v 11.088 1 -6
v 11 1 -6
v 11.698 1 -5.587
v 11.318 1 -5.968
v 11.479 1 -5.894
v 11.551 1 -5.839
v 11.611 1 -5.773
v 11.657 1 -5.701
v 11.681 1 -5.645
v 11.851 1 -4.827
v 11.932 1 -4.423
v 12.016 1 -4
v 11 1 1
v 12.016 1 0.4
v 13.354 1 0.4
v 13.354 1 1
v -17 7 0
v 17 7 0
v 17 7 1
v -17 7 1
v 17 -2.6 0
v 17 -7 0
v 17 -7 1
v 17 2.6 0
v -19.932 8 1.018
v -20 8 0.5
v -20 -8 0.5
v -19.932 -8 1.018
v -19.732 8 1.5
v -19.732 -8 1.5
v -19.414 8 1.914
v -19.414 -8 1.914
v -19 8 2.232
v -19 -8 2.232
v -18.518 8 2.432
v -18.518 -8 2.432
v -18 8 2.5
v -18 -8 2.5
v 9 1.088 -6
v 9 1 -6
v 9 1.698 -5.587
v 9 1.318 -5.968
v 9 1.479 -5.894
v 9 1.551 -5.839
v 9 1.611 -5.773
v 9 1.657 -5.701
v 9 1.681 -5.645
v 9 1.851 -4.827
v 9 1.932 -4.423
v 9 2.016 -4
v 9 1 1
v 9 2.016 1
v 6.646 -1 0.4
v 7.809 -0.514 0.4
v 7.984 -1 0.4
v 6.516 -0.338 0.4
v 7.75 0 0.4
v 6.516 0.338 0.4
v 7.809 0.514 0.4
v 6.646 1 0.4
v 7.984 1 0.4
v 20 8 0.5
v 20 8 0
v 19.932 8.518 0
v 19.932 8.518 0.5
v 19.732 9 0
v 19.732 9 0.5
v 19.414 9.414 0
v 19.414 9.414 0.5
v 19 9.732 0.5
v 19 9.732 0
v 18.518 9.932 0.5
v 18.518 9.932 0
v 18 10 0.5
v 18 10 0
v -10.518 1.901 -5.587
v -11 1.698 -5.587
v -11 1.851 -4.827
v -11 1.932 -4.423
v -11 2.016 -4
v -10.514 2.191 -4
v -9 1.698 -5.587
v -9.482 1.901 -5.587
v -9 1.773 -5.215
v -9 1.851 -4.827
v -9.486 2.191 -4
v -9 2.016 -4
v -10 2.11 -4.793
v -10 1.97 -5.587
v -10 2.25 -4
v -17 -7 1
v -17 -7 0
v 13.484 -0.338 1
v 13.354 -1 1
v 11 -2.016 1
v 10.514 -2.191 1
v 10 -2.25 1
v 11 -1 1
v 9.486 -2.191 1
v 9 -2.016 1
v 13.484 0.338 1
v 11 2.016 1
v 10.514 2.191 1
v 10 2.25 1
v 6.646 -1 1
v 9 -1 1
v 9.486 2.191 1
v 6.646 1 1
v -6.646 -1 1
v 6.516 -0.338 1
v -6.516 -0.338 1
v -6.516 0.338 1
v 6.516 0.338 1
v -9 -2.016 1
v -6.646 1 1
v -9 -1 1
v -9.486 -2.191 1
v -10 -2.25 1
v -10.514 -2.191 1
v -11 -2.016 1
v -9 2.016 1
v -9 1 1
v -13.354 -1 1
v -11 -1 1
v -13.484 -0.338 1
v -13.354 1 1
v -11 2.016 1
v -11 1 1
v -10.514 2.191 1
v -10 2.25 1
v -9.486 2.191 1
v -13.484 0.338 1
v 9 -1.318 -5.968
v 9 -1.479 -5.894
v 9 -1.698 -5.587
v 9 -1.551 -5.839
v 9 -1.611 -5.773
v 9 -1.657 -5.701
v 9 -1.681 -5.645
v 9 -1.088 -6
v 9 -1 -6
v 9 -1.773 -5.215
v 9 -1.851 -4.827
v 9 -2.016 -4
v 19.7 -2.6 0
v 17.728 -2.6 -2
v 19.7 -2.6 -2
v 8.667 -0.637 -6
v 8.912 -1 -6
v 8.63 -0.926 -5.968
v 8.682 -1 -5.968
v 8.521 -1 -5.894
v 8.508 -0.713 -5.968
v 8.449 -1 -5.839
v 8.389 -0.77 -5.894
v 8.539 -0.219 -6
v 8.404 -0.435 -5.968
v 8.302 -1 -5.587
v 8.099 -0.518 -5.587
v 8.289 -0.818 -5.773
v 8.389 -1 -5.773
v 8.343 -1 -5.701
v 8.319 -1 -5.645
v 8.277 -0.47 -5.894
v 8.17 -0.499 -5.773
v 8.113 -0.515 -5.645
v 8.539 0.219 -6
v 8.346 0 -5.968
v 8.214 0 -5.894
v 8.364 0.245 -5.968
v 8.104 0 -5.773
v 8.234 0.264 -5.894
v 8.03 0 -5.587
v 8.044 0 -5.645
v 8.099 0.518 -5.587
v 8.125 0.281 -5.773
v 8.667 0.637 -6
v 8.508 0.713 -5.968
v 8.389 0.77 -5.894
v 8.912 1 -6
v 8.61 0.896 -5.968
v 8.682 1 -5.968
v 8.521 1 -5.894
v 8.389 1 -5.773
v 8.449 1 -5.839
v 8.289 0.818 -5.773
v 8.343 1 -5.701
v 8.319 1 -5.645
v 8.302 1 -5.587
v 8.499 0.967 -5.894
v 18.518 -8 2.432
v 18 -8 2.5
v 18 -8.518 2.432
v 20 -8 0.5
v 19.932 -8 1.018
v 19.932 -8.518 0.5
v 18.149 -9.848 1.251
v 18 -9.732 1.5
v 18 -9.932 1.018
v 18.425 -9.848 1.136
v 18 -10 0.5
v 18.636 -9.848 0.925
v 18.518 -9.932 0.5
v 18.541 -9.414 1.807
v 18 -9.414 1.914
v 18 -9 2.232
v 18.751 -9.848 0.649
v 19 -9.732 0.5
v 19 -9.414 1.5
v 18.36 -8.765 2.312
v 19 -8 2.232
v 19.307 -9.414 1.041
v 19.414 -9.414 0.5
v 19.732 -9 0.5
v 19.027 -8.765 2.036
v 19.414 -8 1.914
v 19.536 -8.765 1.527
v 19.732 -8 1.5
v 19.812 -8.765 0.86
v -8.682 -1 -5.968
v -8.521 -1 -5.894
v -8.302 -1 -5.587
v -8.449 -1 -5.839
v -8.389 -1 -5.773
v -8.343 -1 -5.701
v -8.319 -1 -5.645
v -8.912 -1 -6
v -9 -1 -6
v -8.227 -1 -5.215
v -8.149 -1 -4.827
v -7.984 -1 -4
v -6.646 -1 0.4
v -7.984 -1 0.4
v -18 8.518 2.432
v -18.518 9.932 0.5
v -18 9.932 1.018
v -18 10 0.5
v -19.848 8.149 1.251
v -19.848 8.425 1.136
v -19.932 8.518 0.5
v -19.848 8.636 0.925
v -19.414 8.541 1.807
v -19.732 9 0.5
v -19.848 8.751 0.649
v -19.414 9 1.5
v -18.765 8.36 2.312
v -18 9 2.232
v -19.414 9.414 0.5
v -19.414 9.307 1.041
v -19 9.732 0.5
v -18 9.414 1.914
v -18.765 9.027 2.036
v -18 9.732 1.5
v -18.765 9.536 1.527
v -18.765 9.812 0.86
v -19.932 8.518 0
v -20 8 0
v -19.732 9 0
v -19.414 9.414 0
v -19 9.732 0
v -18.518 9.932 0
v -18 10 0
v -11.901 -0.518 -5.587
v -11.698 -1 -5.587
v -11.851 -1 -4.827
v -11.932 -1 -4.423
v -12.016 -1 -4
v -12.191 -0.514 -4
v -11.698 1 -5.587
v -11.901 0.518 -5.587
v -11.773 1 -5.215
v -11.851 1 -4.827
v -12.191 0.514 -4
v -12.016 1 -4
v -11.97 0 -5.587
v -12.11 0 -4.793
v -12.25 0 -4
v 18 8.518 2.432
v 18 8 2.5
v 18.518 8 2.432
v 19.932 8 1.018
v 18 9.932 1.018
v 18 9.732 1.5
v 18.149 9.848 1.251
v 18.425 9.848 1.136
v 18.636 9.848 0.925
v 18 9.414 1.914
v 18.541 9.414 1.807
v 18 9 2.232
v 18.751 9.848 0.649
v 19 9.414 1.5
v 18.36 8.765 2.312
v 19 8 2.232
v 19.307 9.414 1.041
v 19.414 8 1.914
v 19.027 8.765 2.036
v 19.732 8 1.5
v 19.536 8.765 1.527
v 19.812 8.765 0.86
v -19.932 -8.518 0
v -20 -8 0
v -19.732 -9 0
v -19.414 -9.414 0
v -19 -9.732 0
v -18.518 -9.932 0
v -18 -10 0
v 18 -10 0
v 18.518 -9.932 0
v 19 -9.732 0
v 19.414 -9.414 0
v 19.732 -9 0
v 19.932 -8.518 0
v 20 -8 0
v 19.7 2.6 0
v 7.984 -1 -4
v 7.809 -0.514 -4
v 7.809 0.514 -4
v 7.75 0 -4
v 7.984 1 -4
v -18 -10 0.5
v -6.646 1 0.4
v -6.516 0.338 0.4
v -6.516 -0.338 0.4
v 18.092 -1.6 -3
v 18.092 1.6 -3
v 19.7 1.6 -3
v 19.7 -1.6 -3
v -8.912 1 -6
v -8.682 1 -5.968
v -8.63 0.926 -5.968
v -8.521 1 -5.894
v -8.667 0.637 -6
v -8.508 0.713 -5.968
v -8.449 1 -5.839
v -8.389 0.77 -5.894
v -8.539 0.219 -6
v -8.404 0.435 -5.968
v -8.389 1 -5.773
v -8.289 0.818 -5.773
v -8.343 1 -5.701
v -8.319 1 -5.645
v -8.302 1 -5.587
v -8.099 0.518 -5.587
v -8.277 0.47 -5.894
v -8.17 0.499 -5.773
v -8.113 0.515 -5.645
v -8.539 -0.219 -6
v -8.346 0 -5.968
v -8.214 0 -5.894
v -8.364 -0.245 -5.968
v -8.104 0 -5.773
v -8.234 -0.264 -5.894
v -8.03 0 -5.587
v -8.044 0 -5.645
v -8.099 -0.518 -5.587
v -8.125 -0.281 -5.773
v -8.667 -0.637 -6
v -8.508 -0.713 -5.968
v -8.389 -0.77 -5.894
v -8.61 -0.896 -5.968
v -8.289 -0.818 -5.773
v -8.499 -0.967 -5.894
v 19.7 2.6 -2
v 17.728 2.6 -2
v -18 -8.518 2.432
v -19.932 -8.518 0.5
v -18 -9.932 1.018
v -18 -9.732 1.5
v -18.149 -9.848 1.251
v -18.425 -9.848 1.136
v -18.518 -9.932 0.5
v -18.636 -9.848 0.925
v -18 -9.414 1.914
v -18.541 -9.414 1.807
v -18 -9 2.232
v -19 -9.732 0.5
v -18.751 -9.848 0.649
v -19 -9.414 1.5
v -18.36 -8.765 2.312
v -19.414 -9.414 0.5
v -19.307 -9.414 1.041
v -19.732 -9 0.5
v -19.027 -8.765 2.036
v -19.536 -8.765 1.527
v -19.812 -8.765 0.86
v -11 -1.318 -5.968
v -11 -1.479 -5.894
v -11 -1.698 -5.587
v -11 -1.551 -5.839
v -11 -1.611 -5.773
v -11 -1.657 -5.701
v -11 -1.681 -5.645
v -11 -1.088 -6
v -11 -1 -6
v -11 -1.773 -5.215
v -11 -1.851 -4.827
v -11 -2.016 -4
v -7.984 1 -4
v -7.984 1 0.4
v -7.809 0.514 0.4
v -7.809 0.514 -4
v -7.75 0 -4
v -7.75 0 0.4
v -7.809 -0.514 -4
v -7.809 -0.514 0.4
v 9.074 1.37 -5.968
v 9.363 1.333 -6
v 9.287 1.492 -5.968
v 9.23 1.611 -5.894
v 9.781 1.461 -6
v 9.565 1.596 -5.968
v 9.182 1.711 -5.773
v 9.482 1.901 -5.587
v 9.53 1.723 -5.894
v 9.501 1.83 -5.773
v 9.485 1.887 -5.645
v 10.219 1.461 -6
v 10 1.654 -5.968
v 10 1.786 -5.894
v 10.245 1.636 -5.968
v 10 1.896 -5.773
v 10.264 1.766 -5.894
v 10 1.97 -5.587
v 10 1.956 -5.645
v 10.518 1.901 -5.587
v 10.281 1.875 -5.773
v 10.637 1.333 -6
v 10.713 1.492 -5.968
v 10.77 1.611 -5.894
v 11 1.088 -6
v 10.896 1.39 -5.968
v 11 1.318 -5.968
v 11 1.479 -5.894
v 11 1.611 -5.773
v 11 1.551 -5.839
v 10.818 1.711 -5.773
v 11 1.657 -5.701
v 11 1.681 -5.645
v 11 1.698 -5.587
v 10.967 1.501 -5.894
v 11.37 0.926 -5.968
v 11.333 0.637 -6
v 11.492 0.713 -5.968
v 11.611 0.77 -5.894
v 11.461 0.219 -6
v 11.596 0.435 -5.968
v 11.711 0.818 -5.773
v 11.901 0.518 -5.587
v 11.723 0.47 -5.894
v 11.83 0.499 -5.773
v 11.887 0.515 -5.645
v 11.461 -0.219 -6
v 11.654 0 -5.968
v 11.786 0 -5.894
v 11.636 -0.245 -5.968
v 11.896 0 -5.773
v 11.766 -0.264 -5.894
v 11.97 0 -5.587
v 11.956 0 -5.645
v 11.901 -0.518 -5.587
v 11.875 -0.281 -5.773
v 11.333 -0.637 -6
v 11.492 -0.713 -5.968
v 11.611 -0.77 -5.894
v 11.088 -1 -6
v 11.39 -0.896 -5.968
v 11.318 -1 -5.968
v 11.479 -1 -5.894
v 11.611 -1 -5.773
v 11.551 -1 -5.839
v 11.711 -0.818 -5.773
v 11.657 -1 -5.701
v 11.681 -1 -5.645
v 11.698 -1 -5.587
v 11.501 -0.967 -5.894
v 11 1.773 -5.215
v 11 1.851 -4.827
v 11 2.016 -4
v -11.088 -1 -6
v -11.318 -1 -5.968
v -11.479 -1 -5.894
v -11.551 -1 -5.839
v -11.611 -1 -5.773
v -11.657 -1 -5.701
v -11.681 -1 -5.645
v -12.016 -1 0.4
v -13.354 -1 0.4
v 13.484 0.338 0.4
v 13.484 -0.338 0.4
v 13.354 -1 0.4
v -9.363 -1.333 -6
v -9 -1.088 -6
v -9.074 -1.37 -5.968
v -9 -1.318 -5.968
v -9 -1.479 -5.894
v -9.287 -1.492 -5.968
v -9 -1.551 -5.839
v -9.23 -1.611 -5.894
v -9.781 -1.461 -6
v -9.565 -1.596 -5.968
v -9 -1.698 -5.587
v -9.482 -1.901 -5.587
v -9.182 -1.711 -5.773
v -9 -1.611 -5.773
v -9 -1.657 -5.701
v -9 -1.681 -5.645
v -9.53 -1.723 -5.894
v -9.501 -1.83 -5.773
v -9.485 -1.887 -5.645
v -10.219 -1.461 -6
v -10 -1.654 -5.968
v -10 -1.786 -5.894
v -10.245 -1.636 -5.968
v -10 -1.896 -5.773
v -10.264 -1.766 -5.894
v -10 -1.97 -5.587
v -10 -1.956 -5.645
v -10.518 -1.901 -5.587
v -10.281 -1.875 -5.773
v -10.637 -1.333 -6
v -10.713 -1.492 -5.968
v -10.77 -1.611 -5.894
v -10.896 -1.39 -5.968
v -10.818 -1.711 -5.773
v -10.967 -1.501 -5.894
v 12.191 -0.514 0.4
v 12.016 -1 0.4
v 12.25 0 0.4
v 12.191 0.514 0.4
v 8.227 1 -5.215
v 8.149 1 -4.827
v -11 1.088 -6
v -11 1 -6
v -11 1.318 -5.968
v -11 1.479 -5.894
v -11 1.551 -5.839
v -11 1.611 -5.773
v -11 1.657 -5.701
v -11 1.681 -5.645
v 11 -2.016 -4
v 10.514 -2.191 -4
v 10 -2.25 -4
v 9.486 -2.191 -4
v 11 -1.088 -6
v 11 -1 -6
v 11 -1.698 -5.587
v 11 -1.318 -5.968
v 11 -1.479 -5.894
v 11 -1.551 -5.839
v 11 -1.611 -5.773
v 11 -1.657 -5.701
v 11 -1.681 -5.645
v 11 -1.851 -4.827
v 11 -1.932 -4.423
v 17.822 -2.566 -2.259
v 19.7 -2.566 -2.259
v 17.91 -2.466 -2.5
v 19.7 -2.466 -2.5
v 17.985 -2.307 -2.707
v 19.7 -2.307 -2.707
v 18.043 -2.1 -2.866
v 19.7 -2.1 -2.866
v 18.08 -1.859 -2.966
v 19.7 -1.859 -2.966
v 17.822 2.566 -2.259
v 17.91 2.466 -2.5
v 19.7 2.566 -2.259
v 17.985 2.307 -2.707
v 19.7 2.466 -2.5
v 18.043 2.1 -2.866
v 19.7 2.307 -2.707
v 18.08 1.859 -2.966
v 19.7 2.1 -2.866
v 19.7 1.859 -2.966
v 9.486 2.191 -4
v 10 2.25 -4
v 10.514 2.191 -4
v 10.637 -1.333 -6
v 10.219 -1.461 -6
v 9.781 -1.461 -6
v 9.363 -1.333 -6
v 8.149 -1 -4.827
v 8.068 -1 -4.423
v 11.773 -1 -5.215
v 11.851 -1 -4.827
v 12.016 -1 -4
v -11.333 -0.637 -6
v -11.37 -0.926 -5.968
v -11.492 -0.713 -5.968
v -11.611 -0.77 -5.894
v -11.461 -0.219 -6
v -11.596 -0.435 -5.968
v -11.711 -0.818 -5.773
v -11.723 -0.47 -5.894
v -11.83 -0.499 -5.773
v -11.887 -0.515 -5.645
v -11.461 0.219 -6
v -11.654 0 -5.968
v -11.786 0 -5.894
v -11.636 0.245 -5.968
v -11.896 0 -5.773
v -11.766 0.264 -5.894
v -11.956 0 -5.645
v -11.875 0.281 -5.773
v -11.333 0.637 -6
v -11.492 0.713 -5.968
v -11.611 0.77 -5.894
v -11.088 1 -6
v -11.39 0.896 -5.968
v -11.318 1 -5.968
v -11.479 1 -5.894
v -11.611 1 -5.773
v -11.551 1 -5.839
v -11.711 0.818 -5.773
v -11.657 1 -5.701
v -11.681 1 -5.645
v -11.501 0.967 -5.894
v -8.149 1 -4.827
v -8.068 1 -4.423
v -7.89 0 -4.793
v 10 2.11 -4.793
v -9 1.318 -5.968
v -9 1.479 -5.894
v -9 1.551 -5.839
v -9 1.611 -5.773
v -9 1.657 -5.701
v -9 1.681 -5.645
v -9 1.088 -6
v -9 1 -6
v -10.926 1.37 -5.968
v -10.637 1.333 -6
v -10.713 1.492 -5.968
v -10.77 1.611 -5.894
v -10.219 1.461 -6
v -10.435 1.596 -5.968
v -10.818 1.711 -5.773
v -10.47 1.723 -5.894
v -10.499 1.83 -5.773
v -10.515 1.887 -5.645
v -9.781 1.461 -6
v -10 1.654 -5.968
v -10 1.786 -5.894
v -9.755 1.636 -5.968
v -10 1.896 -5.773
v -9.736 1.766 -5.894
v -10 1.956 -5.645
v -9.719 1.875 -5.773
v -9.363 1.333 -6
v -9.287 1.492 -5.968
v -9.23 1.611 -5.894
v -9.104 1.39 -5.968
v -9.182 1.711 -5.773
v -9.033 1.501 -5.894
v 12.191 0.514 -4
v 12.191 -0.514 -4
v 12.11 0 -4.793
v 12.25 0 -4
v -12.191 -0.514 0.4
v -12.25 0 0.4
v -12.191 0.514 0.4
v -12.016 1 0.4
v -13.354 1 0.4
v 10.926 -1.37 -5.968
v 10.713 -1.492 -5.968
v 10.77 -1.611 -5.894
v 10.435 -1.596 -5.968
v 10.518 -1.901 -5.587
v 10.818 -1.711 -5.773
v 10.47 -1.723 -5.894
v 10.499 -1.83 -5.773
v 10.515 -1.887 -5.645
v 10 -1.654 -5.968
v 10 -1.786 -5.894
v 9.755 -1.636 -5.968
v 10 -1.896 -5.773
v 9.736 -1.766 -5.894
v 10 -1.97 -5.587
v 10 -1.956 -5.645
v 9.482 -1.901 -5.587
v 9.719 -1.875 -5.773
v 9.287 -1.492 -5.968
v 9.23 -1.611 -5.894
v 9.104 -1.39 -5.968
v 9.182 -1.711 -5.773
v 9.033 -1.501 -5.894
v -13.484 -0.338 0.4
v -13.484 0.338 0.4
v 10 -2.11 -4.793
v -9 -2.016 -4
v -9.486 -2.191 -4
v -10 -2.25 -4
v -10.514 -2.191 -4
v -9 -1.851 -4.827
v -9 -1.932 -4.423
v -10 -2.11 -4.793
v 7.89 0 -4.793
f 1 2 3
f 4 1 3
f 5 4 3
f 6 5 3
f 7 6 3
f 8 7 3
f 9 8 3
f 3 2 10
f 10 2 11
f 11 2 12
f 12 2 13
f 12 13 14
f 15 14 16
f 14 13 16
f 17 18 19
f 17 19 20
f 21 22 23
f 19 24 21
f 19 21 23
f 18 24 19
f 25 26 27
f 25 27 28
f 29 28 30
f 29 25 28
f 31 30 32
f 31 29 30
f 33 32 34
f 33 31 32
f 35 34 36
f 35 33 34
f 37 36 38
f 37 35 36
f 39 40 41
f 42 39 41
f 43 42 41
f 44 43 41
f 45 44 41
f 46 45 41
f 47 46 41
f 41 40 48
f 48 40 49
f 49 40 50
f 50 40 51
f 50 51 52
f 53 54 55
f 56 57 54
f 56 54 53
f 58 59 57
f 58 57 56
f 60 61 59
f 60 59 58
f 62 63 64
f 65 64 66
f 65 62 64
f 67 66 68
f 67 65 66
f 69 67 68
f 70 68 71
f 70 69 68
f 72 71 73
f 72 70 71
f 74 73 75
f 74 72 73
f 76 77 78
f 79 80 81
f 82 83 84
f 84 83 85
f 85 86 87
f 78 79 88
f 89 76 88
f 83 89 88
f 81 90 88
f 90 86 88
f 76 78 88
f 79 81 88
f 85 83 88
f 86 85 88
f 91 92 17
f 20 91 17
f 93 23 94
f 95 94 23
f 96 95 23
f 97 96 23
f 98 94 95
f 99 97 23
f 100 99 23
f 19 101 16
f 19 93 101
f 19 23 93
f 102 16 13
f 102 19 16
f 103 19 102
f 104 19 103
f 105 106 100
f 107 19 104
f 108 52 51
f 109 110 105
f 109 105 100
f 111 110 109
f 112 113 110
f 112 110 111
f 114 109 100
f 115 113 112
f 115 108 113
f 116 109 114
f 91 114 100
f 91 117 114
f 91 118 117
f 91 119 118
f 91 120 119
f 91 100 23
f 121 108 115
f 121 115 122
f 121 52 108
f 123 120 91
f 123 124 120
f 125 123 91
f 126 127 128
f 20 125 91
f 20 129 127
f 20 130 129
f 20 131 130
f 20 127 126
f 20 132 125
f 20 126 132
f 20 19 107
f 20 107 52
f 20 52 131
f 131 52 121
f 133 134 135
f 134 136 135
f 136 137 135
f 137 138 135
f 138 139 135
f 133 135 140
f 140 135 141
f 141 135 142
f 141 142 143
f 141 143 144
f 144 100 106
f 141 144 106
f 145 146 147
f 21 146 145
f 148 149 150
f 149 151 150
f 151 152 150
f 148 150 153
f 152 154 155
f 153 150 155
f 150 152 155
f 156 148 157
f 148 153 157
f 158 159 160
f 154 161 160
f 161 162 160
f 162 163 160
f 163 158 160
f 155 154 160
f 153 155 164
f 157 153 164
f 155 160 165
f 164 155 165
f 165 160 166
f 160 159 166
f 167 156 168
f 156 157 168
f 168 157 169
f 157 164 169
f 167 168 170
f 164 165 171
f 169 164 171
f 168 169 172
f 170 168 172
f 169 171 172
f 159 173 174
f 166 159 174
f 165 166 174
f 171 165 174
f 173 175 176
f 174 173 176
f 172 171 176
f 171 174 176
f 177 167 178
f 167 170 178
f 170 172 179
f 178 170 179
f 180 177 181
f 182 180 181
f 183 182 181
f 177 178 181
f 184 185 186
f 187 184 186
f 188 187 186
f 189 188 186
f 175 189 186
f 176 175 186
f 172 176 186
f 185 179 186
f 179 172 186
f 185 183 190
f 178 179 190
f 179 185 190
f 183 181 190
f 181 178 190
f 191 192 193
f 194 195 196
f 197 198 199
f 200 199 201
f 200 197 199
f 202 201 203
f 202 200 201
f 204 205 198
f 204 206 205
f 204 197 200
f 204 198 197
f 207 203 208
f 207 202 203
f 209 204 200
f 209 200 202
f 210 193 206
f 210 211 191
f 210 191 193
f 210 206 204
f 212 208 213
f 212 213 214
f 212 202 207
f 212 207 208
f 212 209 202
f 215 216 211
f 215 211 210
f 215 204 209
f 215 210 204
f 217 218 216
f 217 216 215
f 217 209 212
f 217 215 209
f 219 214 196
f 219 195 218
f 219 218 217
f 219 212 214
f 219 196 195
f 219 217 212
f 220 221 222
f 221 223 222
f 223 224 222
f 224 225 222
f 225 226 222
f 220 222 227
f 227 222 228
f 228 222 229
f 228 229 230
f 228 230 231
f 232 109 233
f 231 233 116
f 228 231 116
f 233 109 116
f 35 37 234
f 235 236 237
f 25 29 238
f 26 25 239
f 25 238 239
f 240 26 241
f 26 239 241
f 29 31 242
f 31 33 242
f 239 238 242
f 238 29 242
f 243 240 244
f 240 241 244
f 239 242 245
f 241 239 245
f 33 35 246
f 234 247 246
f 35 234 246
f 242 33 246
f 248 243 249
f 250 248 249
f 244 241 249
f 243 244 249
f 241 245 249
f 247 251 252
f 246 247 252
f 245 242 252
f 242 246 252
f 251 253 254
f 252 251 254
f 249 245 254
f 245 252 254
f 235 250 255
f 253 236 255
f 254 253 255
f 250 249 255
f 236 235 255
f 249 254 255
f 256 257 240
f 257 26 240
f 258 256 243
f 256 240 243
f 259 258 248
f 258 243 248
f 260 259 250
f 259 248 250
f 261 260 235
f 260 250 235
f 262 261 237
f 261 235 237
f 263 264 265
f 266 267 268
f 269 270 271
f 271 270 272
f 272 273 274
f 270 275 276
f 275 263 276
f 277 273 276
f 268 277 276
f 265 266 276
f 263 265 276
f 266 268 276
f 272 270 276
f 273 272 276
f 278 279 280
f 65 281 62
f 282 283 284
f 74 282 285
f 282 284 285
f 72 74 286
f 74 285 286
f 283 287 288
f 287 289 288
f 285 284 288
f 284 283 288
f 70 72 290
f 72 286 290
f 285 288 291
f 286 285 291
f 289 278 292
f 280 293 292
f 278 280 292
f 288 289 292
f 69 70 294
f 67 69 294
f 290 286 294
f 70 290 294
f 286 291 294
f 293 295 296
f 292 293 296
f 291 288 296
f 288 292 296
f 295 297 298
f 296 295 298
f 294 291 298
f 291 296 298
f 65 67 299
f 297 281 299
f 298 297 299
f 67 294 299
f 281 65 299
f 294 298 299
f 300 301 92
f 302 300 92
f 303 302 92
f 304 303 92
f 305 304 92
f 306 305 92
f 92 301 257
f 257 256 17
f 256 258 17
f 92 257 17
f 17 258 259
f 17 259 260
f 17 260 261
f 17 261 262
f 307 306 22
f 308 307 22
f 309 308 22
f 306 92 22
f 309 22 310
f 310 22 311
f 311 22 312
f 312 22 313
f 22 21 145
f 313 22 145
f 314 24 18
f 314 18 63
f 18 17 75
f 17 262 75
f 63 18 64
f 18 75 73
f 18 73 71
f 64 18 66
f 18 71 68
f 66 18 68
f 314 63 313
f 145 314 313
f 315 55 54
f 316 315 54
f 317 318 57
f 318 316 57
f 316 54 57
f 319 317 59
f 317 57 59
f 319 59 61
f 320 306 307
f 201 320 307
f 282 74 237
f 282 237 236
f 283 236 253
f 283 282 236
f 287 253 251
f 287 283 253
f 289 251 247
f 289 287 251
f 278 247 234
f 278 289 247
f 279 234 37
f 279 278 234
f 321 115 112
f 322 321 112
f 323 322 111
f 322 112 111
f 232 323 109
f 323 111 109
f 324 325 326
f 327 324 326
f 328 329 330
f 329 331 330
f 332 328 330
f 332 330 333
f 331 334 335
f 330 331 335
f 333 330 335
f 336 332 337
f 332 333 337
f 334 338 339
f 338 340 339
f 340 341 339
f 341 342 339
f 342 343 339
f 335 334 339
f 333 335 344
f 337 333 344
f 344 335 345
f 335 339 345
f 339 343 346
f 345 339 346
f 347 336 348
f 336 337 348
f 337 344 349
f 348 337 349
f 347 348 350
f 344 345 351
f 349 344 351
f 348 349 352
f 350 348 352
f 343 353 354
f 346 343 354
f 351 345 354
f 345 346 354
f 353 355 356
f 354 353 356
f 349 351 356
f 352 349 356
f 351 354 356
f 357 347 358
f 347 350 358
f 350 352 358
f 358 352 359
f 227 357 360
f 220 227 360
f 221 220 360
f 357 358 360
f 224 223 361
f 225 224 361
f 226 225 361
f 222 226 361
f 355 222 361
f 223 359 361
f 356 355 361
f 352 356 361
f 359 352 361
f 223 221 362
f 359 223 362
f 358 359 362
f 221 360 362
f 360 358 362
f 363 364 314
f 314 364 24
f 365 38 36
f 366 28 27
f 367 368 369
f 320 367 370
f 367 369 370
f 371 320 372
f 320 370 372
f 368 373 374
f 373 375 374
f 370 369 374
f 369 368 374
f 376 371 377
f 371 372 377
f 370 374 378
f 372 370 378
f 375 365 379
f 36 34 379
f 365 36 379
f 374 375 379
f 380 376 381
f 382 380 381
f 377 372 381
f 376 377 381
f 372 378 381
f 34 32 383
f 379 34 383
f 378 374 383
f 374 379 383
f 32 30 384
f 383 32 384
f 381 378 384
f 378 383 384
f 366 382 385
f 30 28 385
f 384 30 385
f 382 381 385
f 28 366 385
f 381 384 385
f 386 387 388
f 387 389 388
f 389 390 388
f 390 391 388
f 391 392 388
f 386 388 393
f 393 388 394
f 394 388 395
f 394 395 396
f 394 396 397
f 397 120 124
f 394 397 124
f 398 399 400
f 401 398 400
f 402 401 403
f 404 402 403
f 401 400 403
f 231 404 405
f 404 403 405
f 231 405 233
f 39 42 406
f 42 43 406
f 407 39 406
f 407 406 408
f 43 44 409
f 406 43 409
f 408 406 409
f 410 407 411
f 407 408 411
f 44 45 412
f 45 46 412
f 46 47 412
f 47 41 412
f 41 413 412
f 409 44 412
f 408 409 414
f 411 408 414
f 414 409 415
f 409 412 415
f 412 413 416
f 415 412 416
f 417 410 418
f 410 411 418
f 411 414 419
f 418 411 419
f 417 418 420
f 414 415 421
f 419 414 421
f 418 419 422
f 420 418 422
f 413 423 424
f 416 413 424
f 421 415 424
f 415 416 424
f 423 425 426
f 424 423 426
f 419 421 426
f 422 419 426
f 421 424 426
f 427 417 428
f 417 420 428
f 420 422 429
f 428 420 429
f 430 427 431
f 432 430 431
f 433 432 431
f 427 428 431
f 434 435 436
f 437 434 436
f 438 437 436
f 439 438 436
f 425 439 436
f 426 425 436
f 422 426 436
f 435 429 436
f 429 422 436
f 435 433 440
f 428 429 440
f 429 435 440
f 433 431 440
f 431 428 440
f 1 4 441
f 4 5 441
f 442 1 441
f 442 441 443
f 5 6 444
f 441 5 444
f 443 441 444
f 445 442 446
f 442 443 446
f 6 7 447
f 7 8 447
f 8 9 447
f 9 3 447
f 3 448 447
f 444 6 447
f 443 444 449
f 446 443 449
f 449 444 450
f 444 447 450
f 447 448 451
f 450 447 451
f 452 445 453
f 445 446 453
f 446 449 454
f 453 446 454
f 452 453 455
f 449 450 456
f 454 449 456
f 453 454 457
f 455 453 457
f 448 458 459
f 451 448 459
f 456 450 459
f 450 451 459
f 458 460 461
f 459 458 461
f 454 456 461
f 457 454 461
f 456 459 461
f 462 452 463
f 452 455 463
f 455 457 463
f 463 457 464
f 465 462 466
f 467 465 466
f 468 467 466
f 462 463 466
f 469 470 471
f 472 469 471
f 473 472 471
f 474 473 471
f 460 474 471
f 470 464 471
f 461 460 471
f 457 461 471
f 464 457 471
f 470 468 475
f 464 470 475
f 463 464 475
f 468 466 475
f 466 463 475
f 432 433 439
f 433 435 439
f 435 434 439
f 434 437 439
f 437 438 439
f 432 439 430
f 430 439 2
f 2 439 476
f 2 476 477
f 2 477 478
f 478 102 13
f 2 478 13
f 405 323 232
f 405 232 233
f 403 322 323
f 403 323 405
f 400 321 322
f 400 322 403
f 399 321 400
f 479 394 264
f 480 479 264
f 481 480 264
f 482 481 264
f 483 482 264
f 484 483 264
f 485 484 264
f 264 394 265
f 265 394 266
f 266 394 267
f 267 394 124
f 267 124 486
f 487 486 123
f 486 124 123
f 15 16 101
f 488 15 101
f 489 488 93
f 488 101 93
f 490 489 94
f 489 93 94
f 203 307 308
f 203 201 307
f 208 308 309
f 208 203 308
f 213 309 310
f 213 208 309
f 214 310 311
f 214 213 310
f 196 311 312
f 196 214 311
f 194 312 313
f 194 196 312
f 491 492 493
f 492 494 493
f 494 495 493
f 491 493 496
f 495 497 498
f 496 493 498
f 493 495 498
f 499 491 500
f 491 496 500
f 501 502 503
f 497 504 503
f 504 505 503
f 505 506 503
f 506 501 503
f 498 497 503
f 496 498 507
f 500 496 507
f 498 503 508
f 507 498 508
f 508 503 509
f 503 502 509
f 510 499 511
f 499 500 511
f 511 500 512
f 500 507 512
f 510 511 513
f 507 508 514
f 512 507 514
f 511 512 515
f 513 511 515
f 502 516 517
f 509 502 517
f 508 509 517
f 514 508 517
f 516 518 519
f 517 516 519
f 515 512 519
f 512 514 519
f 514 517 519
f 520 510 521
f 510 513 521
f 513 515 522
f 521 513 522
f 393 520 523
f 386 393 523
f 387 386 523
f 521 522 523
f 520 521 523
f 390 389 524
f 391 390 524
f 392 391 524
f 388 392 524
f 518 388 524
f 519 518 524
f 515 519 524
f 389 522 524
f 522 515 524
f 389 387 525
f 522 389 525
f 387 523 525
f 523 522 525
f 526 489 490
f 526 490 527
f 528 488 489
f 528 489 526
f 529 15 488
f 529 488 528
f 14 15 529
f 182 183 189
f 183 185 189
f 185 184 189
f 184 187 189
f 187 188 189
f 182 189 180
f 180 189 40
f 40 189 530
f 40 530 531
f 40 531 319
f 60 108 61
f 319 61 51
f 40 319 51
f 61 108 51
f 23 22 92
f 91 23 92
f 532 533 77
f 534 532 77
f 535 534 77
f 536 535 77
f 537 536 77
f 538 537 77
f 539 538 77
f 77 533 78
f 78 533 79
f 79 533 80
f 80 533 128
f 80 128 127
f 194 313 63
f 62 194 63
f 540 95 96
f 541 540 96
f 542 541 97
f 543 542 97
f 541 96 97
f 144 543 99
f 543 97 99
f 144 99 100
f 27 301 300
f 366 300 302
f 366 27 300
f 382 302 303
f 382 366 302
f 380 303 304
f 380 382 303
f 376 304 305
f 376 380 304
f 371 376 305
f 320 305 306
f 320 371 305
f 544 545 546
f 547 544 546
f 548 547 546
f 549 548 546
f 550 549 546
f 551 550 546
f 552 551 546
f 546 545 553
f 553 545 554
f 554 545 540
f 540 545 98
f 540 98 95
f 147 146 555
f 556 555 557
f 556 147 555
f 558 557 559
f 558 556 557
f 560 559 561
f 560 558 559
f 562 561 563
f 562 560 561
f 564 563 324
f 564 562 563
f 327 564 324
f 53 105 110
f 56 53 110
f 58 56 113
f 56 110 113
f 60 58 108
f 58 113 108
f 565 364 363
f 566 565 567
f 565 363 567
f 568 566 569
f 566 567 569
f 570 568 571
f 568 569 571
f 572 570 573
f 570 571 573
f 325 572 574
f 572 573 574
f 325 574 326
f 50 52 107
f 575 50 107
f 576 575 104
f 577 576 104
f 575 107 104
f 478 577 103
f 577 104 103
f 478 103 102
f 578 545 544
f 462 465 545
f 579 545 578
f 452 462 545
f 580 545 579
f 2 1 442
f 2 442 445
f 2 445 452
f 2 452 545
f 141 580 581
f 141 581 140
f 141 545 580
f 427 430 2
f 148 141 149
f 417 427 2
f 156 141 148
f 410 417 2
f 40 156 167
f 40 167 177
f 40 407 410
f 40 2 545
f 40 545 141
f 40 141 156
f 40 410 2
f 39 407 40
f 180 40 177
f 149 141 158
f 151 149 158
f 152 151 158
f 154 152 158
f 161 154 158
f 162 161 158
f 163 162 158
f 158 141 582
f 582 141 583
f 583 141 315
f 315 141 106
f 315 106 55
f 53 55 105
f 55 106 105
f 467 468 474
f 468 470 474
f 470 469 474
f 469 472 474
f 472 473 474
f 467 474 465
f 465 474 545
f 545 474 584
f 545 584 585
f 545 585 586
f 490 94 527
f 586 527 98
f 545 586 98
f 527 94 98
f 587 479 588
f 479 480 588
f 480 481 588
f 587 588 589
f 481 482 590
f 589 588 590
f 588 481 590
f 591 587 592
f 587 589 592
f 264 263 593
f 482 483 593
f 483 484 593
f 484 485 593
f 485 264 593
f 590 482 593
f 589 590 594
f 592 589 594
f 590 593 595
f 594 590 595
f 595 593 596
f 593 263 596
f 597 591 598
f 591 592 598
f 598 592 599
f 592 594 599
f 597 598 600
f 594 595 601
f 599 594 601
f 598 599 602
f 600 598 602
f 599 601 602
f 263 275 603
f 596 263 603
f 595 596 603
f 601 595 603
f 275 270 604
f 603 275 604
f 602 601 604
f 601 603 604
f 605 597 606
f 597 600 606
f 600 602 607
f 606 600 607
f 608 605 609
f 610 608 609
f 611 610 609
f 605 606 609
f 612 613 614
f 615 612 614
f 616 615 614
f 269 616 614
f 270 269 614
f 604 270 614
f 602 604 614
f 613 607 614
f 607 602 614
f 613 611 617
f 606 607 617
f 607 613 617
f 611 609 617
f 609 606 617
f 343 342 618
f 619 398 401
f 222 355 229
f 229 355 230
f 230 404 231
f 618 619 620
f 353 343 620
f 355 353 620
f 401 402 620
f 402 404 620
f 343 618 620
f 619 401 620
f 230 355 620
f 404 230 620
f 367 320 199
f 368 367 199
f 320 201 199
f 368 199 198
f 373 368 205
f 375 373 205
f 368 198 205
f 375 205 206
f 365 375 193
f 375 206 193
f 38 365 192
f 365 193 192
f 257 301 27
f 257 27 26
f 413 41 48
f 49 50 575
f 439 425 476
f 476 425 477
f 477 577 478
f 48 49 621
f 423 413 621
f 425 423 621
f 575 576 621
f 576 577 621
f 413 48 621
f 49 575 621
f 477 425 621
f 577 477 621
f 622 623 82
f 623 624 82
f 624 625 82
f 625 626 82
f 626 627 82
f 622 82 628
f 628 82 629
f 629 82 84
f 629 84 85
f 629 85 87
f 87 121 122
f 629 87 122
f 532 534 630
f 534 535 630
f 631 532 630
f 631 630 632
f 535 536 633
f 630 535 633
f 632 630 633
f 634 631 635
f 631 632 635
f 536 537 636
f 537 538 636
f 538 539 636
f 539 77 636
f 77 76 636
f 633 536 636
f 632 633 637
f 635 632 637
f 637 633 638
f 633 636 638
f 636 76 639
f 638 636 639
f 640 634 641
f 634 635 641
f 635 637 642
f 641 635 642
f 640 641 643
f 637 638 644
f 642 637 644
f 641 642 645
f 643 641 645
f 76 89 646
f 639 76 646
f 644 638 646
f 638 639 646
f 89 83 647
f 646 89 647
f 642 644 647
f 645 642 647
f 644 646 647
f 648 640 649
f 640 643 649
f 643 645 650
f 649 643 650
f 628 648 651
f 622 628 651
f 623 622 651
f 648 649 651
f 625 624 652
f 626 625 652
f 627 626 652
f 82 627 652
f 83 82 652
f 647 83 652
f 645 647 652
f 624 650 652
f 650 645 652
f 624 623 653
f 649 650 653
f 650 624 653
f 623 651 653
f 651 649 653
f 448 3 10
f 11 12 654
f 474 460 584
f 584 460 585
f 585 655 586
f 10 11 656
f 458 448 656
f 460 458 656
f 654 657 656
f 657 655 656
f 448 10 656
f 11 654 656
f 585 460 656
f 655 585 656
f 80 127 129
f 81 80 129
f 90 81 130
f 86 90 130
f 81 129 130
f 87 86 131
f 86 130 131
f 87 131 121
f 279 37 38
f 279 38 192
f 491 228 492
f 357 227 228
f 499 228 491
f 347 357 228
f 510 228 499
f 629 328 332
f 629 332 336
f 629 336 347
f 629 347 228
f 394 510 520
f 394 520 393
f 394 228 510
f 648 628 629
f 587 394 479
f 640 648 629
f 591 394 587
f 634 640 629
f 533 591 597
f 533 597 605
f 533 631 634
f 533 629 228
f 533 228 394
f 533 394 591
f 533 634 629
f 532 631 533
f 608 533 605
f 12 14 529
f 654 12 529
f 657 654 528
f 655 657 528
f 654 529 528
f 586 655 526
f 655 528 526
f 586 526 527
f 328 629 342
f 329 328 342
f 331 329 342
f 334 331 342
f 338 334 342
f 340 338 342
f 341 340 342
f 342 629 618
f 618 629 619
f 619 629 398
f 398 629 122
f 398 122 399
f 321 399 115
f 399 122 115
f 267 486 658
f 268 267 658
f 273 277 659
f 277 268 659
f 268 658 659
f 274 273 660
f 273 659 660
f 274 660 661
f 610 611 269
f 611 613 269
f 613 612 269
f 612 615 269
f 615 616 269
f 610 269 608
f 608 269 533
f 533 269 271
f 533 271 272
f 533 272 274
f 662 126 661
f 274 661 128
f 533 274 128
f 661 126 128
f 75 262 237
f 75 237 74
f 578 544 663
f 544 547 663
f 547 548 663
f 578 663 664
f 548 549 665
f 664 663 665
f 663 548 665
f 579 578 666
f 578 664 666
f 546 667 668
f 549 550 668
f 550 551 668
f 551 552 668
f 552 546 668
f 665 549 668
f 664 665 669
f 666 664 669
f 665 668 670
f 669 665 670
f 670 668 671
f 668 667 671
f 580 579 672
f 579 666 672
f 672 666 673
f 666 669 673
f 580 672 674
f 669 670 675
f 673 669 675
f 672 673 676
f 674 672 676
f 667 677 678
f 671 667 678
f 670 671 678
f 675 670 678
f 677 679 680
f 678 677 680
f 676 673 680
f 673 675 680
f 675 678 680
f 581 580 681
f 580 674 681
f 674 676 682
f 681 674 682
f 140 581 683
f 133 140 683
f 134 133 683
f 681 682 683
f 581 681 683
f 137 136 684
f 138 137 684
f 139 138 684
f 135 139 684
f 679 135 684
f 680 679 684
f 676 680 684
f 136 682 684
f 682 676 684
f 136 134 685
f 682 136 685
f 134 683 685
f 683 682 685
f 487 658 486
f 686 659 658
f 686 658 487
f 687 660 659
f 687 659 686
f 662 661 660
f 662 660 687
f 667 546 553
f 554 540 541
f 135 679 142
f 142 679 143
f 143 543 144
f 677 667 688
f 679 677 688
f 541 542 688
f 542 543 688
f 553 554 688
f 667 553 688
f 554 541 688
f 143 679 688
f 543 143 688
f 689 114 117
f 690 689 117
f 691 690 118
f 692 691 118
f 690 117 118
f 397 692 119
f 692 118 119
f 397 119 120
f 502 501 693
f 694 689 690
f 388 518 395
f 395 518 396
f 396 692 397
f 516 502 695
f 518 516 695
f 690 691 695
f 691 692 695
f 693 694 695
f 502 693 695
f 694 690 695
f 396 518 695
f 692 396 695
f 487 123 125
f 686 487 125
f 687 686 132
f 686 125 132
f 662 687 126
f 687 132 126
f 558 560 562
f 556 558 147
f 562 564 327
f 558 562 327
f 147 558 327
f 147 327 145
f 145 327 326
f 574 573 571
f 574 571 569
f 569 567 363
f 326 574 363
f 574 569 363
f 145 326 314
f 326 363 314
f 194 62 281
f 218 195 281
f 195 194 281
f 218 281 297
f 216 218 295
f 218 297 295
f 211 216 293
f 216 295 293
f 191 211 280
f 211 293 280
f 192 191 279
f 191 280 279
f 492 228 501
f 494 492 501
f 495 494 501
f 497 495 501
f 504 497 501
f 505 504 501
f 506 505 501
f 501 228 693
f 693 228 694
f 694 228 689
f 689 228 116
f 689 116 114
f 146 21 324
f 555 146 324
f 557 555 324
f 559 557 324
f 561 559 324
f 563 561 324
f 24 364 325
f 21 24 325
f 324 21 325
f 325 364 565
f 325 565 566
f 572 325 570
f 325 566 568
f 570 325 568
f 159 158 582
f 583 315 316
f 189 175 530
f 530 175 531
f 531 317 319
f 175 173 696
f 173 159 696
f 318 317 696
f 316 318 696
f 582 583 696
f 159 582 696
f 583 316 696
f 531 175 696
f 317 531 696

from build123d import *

# Parameters (mm, degrees)
SKETCH1_W           = 40
SKETCH1_H           = 20
BOSS_EXTRUDE1_DEPTH = 2.5
FILLET1_R           = 2
SKETCH2_W           = 34
SKETCH2_H           = 14
CUT_EXTRUDE1_DEPTH  = 1
BOSS_EXTRUDE2_DEPTH = 2.6
FILLET2_R           = 1
BOSS_EXTRUDE3_DEPTH = 7
BOSS_EXTRUDE4_DEPTH = 0.6
LPATTERN1_COUNT     = 2
LPATTERN1_PITCH     = 20


with BuildPart() as part:
    # Sketch1 → Boss-Extrude1 (new body)
    with BuildSketch(Plane.XY):
        Rectangle(SKETCH1_W, SKETCH1_H)
    extrude(amount=BOSS_EXTRUDE1_DEPTH)

    # Fillet1
    fillet1_edges = [part.edges().sort_by_distance(p)[0] for p in [
        (20, 0, 2.5),
        (0, 10, 2.5),
        (-20, 0, 2.5),
        (0, -10, 2.5),
        (-20, 10, 1.25),
        (20, 10, 1.25),
        (20, -10, 1.25),
        (-20, -10, 1.25),
    ]]
    fillet(fillet1_edges, radius=FILLET1_R)

    # Sketch2 → Cut-Extrude1 (cut)
    with BuildSketch(Plane(origin=(0, 0, 0), x_dir=(-1, 0, 0), z_dir=(0, 0, -1))):
        Rectangle(SKETCH2_W, SKETCH2_H)
    extrude(amount=-CUT_EXTRUDE1_DEPTH, mode=Mode.SUBTRACT)

    # Sketch3 → Boss-Extrude2 (add, symmetric)
    with BuildSketch(Plane(origin=(0, 0, 0), x_dir=(0, 0, -1), z_dir=(0, 1, 0))):
        Polygon((0, -17), (3, -18.091910703), (3, -19.7), (0, -19.7), align=None)
    extrude(amount=BOSS_EXTRUDE2_DEPTH, both=True)

    # Fillet2
    fillet2_edges = [part.edges().sort_by_distance(p)[0] for p in [
        (18.895955351, -2.6, -3),
        (18.895955351, 2.6, -3),
    ]]
    fillet(fillet2_edges, radius=FILLET2_R)

    # Sketch4 → Boss-Extrude3 (add)
    with BuildSketch(Plane(origin=(0, 0, 1), x_dir=(-1, 0, 0), z_dir=(0, 0, -1))):
        with BuildLine():
            Line((-12.015564437, -1), (-11, -1))
            Line((-11, -1), (-11, -2.015564437))
            ThreePointArc((-11, -2.015564437), (-10, -2.25), (-9, -2.015564437))
            Line((-9, -2.015564437), (-9, -1))
            Line((-9, -1), (-7.984435563, -1))
            ThreePointArc((-7.984435563, -1), (-7.75, 0), (-7.984435563, 1))
            Line((-7.984435563, 1), (-9, 1))
            Line((-9, 1), (-9, 2.015564437))
            ThreePointArc((-9, 2.015564437), (-10, 2.25), (-11, 2.015564437))
            Line((-11, 2.015564437), (-11, 1))
            Line((-11, 1), (-12.015564437, 1))
            ThreePointArc((-12.015564437, 1), (-12.25, 0), (-12.015564437, -1))
        make_face()
    boss_extrude3 = extrude(amount=BOSS_EXTRUDE3_DEPTH)

    # Sketch5 → Cut-Revolve1 (revolve, cut)
    with BuildSketch(Plane(origin=(0, 0, 0), x_dir=(0, 0, -1), z_dir=(0, 1, 0))):
        with BuildLine():
            Line((4, -7.75), (6, -7.75))
            Line((6, -7.75), (6, -8.522203777))
            ThreePointArc((6, -8.522203777), (5.883022222, -8.200809972), (5.586824089, -8.0297999))
            Line((5.586824089, -8.0297999), (4, -7.75))
        make_face()
    cut_revolve1 = revolve(axis=Axis((10, 0, 1), (0, 0, -1)), mode=Mode.SUBTRACT)

    # Sketch6 → Boss-Extrude4 (add)
    with BuildSketch(Plane(origin=(0, 0, 1), x_dir=(-1, 0, 0), z_dir=(0, 0, -1))):
        with BuildLine():
            Line((-13.354101966, -1), (-6.645898034, -1))
            ThreePointArc((-6.645898034, -1), (-6.5, 0), (-6.645898034, 1))
            Line((-6.645898034, 1), (-13.354101966, 1))
            ThreePointArc((-13.354101966, 1), (-13.5, 0), (-13.354101966, -1))
        make_face()
    boss_extrude4 = extrude(amount=BOSS_EXTRUDE4_DEPTH)

    # LPattern1: Boss-Extrude3, Cut-Revolve1, Boss-Extrude4 ×2
    with Locations(*[(-i * LPATTERN1_PITCH, 0, 0) for i in range(1, LPATTERN1_COUNT)]):
        add(boss_extrude3)
        add(cut_revolve1, mode=Mode.SUBTRACT)
        add(boss_extrude4)


solid = part.part
